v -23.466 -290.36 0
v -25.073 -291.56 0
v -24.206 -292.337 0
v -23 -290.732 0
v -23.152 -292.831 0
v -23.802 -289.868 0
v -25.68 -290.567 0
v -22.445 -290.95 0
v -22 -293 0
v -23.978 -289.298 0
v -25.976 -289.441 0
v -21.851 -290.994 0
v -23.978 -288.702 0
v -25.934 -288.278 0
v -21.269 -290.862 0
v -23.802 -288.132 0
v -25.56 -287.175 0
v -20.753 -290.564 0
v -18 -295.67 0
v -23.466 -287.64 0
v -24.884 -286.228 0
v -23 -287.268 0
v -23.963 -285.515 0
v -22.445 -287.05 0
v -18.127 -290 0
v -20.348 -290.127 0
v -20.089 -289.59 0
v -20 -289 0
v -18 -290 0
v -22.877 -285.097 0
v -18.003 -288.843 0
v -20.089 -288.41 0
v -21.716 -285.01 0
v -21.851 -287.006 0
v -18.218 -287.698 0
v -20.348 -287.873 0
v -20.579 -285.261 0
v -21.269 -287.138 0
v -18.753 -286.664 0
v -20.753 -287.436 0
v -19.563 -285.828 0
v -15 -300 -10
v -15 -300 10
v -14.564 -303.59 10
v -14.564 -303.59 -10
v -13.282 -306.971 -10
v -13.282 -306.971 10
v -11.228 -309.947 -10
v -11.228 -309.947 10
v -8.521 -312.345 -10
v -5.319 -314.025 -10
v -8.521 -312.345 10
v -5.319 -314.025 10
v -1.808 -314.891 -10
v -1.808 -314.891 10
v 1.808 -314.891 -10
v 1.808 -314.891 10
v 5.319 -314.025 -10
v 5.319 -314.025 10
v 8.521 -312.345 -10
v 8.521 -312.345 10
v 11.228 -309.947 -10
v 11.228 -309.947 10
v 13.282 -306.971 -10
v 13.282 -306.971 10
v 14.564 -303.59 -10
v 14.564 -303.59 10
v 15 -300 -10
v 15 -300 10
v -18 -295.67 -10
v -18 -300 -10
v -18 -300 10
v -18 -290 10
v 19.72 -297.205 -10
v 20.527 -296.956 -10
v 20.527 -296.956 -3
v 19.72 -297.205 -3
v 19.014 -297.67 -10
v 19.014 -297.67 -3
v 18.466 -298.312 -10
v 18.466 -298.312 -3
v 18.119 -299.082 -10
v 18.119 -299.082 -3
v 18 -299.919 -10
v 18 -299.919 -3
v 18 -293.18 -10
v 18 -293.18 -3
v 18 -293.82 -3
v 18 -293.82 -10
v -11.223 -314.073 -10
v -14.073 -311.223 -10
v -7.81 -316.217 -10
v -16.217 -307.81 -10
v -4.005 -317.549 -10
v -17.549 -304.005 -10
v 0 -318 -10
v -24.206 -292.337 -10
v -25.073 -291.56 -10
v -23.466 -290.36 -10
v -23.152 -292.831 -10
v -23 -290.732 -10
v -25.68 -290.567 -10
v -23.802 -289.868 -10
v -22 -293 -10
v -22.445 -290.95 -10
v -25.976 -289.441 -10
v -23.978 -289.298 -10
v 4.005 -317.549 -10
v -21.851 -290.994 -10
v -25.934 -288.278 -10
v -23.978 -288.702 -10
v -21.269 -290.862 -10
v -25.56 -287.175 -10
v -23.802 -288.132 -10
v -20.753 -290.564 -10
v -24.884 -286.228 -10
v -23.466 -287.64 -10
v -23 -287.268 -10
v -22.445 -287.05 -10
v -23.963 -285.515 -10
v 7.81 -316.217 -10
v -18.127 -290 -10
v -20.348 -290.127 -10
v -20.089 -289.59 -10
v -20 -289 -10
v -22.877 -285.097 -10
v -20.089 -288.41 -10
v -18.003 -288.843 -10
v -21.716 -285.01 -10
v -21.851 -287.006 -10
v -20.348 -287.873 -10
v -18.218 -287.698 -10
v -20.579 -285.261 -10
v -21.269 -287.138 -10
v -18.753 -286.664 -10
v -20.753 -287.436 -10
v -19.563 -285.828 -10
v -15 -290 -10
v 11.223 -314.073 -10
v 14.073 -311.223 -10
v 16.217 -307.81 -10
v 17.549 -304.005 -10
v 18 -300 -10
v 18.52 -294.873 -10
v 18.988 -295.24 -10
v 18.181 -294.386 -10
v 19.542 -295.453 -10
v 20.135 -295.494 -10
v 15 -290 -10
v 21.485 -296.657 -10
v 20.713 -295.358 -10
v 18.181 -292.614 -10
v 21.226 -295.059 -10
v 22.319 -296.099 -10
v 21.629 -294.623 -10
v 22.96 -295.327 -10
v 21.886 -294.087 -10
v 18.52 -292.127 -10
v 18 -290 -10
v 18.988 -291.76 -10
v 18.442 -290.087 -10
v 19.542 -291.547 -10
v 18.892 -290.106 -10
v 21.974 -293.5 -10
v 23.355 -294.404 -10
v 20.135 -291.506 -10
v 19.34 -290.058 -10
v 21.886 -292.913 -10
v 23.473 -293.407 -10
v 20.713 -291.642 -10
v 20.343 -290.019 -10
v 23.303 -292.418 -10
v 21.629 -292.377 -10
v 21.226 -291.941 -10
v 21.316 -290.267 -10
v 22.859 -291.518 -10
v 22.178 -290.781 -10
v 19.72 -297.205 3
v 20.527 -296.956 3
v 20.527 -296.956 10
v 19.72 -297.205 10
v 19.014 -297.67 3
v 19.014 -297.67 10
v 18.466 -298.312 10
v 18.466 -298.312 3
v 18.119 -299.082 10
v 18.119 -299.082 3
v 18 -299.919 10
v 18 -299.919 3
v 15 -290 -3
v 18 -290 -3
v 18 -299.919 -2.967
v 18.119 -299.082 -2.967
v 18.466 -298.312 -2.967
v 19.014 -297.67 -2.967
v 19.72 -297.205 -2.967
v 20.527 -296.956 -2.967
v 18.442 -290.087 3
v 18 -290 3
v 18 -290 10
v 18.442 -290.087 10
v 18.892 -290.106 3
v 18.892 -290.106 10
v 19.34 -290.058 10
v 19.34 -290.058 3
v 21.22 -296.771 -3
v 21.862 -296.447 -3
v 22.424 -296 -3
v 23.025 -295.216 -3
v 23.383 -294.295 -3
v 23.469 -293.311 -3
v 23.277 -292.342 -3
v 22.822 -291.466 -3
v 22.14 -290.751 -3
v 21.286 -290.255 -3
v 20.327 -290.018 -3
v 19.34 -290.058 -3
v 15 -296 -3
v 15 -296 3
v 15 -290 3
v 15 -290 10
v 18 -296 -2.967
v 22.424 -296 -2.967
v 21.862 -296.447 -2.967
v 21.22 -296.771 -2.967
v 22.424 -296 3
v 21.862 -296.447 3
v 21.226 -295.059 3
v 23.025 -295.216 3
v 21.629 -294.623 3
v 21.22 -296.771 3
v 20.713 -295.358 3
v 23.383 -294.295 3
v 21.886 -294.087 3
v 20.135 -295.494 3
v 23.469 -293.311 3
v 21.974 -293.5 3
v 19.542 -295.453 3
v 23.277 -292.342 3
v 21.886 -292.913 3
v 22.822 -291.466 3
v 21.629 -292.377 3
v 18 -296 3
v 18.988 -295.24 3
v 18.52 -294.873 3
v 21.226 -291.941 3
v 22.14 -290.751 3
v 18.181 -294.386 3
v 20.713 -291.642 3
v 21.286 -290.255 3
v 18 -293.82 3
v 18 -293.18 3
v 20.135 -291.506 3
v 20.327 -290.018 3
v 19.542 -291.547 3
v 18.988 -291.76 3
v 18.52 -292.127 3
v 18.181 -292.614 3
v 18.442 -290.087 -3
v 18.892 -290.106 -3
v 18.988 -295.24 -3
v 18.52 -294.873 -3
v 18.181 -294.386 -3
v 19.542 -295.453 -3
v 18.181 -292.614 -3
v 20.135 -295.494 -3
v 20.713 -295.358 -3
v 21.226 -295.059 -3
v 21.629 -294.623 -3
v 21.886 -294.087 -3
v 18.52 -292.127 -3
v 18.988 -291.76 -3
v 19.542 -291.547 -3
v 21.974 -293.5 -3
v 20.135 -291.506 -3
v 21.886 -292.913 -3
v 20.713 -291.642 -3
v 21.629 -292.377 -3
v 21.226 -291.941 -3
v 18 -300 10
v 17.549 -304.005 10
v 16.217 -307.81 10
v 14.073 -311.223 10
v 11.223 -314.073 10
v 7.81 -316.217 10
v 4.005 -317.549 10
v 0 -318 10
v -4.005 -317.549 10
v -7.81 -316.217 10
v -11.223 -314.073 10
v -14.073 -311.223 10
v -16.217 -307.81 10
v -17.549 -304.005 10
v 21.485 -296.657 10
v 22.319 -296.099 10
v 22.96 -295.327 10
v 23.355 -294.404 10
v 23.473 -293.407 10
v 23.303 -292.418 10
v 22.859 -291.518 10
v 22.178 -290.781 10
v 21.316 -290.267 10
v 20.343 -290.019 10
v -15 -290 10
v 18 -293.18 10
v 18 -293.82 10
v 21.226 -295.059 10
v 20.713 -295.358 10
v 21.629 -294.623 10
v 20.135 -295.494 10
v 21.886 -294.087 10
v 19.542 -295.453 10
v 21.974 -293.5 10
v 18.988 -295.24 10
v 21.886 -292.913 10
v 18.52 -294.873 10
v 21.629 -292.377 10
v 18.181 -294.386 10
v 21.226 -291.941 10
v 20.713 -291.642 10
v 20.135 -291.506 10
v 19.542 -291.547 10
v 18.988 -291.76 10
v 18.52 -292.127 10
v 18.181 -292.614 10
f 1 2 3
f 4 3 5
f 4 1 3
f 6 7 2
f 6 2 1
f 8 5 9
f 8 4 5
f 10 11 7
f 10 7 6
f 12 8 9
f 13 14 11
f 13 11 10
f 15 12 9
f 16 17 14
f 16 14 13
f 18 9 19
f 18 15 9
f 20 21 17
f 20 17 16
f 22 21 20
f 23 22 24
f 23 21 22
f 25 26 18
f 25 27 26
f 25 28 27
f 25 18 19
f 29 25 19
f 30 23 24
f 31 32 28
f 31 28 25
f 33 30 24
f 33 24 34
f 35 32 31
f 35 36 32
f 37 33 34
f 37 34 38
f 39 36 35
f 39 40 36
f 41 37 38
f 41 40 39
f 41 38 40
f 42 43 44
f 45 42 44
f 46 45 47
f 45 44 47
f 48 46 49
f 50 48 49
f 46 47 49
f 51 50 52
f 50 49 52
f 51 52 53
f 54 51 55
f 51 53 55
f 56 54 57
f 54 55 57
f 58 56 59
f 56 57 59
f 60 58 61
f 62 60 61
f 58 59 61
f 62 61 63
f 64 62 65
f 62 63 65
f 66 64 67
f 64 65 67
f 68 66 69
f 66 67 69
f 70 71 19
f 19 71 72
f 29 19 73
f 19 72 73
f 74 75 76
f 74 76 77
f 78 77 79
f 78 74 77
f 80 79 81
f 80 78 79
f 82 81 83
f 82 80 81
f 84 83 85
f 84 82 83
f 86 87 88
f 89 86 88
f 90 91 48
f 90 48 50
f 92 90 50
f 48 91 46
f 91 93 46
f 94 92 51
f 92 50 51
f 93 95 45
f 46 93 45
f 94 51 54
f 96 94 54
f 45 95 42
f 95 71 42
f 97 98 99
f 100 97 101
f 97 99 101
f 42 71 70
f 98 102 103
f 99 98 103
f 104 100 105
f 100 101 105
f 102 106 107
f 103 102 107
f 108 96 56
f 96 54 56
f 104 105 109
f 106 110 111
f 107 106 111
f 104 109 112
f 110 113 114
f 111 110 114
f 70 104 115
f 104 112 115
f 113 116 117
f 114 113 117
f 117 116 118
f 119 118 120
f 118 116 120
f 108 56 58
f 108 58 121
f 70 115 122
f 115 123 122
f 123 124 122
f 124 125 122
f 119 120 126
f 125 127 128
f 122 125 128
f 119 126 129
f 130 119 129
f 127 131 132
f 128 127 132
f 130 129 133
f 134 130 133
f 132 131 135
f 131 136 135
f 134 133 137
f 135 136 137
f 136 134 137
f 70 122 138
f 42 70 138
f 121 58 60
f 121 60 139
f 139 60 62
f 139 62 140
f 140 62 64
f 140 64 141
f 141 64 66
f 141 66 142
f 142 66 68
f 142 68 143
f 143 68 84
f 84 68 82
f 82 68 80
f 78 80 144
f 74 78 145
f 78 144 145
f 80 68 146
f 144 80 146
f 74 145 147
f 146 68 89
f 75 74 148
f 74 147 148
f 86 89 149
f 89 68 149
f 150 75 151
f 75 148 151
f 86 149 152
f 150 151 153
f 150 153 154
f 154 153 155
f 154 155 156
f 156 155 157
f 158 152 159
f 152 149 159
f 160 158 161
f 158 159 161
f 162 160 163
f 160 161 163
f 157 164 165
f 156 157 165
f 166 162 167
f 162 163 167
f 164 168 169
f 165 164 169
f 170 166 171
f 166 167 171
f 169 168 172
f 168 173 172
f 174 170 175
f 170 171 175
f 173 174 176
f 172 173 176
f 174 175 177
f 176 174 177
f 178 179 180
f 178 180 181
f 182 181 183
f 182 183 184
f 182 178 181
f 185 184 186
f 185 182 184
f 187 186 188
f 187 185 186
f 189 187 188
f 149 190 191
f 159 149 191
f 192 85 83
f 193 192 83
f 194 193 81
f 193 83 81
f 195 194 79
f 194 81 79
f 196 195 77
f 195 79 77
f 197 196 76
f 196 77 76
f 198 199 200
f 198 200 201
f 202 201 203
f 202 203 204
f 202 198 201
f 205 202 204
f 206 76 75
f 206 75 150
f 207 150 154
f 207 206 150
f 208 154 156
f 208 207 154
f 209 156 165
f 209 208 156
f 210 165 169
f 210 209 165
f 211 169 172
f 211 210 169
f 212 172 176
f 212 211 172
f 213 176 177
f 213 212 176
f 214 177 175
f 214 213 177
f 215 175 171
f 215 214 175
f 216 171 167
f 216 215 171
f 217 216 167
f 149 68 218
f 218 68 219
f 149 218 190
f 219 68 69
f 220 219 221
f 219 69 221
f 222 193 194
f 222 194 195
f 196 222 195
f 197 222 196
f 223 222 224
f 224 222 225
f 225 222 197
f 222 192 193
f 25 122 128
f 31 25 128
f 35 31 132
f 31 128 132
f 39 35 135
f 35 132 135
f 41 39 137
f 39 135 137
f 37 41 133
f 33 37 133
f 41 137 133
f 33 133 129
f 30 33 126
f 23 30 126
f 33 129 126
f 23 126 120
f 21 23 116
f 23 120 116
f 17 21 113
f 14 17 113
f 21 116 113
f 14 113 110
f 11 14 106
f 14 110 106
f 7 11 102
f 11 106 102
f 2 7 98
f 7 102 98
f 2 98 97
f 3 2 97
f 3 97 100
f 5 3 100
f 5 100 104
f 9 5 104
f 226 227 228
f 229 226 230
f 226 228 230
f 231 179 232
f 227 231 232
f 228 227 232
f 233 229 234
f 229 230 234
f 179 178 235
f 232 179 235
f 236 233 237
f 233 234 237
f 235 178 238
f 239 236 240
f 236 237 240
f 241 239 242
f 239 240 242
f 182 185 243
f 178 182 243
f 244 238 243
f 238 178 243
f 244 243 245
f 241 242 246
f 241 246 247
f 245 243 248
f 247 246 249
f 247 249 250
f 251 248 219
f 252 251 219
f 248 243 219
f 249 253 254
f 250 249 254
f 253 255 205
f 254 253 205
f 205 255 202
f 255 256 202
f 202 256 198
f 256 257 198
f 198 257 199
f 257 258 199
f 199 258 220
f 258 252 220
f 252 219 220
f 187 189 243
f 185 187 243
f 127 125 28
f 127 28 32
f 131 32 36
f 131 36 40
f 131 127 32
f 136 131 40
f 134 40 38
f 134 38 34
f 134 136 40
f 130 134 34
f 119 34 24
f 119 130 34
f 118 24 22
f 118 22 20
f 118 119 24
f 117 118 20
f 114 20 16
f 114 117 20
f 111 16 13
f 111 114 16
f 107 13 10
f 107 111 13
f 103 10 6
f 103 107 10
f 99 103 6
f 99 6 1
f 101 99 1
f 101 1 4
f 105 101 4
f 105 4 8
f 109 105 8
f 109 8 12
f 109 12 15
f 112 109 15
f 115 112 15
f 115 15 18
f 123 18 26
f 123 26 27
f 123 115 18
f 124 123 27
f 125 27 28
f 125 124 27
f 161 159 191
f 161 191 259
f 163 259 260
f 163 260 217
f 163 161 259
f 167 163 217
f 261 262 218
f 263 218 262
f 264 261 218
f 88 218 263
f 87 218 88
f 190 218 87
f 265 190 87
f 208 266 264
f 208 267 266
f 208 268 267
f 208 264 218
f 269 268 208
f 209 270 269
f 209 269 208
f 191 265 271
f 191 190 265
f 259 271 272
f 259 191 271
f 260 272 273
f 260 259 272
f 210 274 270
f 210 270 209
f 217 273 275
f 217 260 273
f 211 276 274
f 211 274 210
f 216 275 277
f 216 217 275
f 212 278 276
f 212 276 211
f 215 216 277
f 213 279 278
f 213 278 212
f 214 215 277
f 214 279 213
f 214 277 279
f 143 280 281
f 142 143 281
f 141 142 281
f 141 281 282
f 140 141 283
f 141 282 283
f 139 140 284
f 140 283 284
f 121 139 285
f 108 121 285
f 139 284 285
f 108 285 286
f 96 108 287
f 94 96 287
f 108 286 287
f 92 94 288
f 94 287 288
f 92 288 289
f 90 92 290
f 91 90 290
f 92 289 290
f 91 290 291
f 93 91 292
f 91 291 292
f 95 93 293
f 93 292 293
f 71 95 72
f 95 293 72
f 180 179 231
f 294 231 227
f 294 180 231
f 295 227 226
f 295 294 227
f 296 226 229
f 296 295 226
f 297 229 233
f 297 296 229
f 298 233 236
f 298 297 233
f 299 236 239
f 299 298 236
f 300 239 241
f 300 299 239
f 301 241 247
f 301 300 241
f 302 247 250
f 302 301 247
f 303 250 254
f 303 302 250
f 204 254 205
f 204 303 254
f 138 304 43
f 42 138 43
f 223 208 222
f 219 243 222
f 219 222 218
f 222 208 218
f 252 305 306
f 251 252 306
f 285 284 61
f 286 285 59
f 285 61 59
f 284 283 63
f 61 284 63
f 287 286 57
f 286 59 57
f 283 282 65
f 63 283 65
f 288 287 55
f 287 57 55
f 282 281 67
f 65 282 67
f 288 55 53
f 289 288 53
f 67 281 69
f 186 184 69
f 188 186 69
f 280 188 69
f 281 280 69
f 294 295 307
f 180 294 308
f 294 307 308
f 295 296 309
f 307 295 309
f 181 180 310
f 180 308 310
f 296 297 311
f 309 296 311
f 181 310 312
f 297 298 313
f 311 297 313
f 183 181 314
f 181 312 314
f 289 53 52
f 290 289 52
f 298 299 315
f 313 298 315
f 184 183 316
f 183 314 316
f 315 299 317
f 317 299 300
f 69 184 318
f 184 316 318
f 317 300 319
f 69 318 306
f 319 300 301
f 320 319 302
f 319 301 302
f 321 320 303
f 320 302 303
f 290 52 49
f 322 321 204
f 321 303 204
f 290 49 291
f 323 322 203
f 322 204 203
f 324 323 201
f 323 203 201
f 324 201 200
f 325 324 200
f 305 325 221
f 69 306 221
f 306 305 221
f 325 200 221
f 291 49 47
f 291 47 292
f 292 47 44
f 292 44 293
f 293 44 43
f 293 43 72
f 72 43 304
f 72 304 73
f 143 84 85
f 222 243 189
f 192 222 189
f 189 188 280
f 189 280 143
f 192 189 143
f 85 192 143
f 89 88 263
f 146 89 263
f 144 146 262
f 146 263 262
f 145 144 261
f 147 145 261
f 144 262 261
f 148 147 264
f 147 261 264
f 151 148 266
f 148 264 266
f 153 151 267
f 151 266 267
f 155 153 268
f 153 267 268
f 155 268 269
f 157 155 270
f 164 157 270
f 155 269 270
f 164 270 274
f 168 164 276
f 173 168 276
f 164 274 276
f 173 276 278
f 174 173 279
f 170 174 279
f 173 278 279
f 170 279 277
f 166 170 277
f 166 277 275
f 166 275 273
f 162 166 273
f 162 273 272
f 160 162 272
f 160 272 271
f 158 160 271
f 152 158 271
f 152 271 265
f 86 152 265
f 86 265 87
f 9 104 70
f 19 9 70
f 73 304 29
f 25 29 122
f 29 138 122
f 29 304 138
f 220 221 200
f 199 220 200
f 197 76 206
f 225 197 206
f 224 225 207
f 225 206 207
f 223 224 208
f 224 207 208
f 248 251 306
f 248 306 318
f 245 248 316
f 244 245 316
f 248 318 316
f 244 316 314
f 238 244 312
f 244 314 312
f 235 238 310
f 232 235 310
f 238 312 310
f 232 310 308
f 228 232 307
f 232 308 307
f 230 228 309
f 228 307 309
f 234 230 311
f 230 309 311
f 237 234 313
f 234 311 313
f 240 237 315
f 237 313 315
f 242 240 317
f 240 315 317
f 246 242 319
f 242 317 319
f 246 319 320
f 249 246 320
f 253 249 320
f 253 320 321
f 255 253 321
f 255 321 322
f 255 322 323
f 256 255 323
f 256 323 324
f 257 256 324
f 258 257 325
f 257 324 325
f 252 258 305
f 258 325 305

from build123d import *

# Parameters (mm, degrees)
SKETCH1_R                           = 4
SKETCH1_R_2                         = 2
BOSS_EXTRUDE1_DEPTH                 = 10
BOSS_EXTRUDE2_DEPTH                 = 20
BOSS_EXTRUDE3_DEPTH                 = 10
SKETCH5_R                           = 3.5
SKETCH5_R_2                         = 2
BOSS_EXTRUDE4_DEPTH                 = 20
SKETCH4_W                           = 6
SKETCH4_H                           = 6.000142194
CUT_EXTRUDE1_DEPTH                  = 3
CUT_EXTRUDE1_DIRECTION_2_REACH      = 323.185
CUT_EXTRUDE1_DIRECTION_2_END_RADIUS = 3.5
FILLET2_R                           = 3
SKETCH6_W                           = 4.423537042
SKETCH6_H                           = 5.967206981
CUT_EXTRUDE2_DEPTH                  = 36.49639057
BODY_MOVE_COPY1_OUTLINE_R           = 2
BODY_MOVE_COPY1_DEPTH               = 10
BODY_MOVE_COPY1_START               = 2.967206981
BODY_MOVE_COPY1_2_DEPTH             = 0.032793019
BODY_MOVE_COPY1_START_2             = -10
BODY_MOVE_COPY1_3_OUTLINE_R         = 2
BODY_MOVE_COPY1_3_DEPTH             = 10
BODY_MOVE_COPY1_START_3             = -3
BODY_MOVE_COPY1_4_DEPTH             = 0.032793019


# Read off the part's stored shape, not the designer's step: Body-Move/Copy1
with BuildPart() as part:
    # Sketch1 → Boss-Extrude1 (new body)
    with BuildSketch(Plane.XY):
        with Locations(Location((-22, -289, 0), (0, 0, 270))):
            Circle(SKETCH1_R)
        with Locations(Location((-22, -289, 0), (0, 0, 270))):
            Circle(SKETCH1_R_2, mode=Mode.SUBTRACT)
    extrude(amount=BOSS_EXTRUDE1_DEPTH)



with BuildPart() as body_2:
    # Sketch2 → Boss-Extrude2 (new body)
    with BuildSketch(Plane.XY.offset(10)):
        with BuildLine():
            Line((-18, -300), (-18, -295.71047836))
            Line((-18, -295.71047836), (-18, -290))
            Line((-18, -290), (-15, -290))
            Line((-15, -290), (-15, -300))
            ThreePointArc((-15, -300), (0, -315), (15, -300))
            Line((15, -300), (15, -290))
            Line((15, -290), (18, -290))
            Line((18, -290), (18, -300))
            ThreePointArc((18, -300), (0, -318), (-18, -300))
        make_face()
    extrude(amount=-BOSS_EXTRUDE2_DEPTH)


with BuildPart() as part_1:
    add(part.part)

    add(body_2.part)  # Boss-Extrude3 merges body 2
    # Sketch3 → Boss-Extrude3 (add)
    with BuildSketch(Plane.XY.offset(10)):
        Polygon((-18, -290), (-18.290403154, -290), (-22, -293), (-18, -295.669919522), align=None)
    extrude(amount=-BOSS_EXTRUDE3_DEPTH)

    # Sketch5 → Boss-Extrude4 (add)
    with BuildSketch(Plane.XY.offset(10)):
        with Locations((19.974192434, -293.5)):
            Circle(SKETCH5_R)
        with Locations((19.974192434, -293.5)):
            Circle(SKETCH5_R_2, mode=Mode.SUBTRACT)
    extrude(amount=-BOSS_EXTRUDE4_DEPTH)

    # Sketch4 → Cut-Extrude1 (cut)
    with BuildSketch(Plane(origin=(18, 0, 0), x_dir=(0, 0, -1), z_dir=(1, 0, 0))):
        with Locations((0, -293.000071097)):
            Rectangle(SKETCH4_W, SKETCH4_H)
    extrude(amount=-CUT_EXTRUDE1_DEPTH, mode=Mode.SUBTRACT)

    # Cut-Extrude1 direction 2: up to this cylinder (the profile starts inside it)
    cut_extrude1_direction_2_end = Plane(origin=(19.974192434, -293.5, 0), z_dir=(0, 0, 1)) * Cylinder(CUT_EXTRUDE1_DIRECTION_2_END_RADIUS, 654.37, mode=Mode.PRIVATE)
    # Sketch4 → Cut-Extrude1 direction 2 (cut, up to the surface)
    with BuildSketch(Plane(origin=(18, 0, 0), x_dir=(0, 0, -1), z_dir=(1, 0, 0)), mode=Mode.PRIVATE) as cut_extrude1_direction_2_sk1:
        with Locations((0, -293.000071097)):
            Rectangle(SKETCH4_W, SKETCH4_H)
    cut_extrude1_direction_2_tool1 = extrude(cut_extrude1_direction_2_sk1.sketch, amount=CUT_EXTRUDE1_DIRECTION_2_REACH, mode=Mode.PRIVATE) & cut_extrude1_direction_2_end
    add(cut_extrude1_direction_2_tool1.solids().sort_by_distance((18, -293.000071, 0))[0], mode=Mode.SUBTRACT)

    # Fillet2
    # the kernel refuses this fillet: 3 mm, written as the material it adds along each edge
    with BuildSketch(Plane(origin=(18, -290.609919684, -10), x_dir=(1.5610699103436222e-12, 1.0, 0), z_dir=(0, 0, 1)), Plane(origin=(18, -290.609919684, 3), x_dir=(1.5610699103436222e-12, 1.0, 0), z_dir=(0, 0, 1))) as fillet2_piece_1:
        with BuildLine():
            CenterArc((3.502304969, -0.796308584), FILLET2_R, 164.60712684, 25.833288924)
            Line((0.551973299, -1.339947284), (0.492966665, -1.350820058))
            ThreePointArc((0.492966665, -1.350820058), (0.29061984, -0.663945695), (-0.049544234, -0.033843299))
            Line((-0.049544234, -0.033843299), (0, 0.06))
            ThreePointArc((0, 0.06), (0.304959842, 0.06), (0.552071978, 0.015926172))
            Line((0.552071978, 0.015926172), (0.609919684, 0))
        make_face()
    extrude(amount=7)
    with BuildSketch(Plane(origin=(18, -296.390080316, -10), x_dir=(0.975809068162025, -0.21862447825611958, 0), z_dir=(0, 0, 1))) as fillet2_piece_2:
        with BuildLine():
            CenterArc((3.698835937, -2.787234318), FILLET2_R, 111.708438384, 80.919816446)
            Line((0.771408732, -3.443107753), (0.712860188, -3.456225222))
            Line((0.712860188, -3.456225222), (-0.058548544, -0.013117469))
            Line((-0.058548544, -0.013117469), (0.022193016, 0.055744686))
            ThreePointArc((0.022193016, 0.055744686), (1.294592578, -0.188226629), (2.56699214, 0.055744686))
            Line((2.56699214, 0.055744686), (2.589185156, 0))
        make_face()
    extrude(amount=20)

    # Sketch6 → Cut-Extrude2 (cut, through all)
    with BuildSketch(Plane(origin=(0, -296.000142194, 0), x_dir=(1, 0, 0), z_dir=(0, 1, 0))):
        with Locations((20.211768521, 0.016396509)):
            Rectangle(SKETCH6_W, SKETCH6_H)
    extrude(amount=-CUT_EXTRUDE2_DEPTH, mode=Mode.SUBTRACT)

    # Body-Move/Copy1 outline → Body-Move/Copy1 (cut)
    with BuildSketch(Plane.XY):
        with BuildLine():
            Line((-18, -290), (-18.127016654, -290))
            ThreePointArc((-18.127016654, -290), (-24.449489743, -285.83772234), (-22, -293))
            Line((-22, -293), (-18, -295.669919522))
            Line((-18, -295.669919522), (-18, -290))
        make_face()
        with Locations((-22, -289)):
            Circle(BODY_MOVE_COPY1_OUTLINE_R, mode=Mode.SUBTRACT)
    extrude(amount=BODY_MOVE_COPY1_DEPTH, mode=Mode.SUBTRACT)

    # Body-Move_Copy1 2 outline → Body-Move_Copy1 2 (cut)
    with BuildSketch(Plane.XY.offset(BODY_MOVE_COPY1_START)):
        with BuildLine():
            ThreePointArc((20.526550354, -296.95613957), (21.549323306, -296.625533992), (22.423537042, -296.000142194))
            Line((22.423537042, -296.000142194), (18, -296.000142194))
            Line((18, -296.000142194), (18, -299.918544916))
            ThreePointArc((18, -299.918544916), (18.71741934, -297.971797492), (20.526550354, -296.95613957))
        make_face()
    extrude(amount=BODY_MOVE_COPY1_2_DEPTH, mode=Mode.SUBTRACT)

    # Body-Move_Copy1 3 outline → Body-Move_Copy1 3 (add)
    with BuildSketch(Plane.XY.offset(BODY_MOVE_COPY1_START_2)):
        with BuildLine():
            Line((-18, -290), (-18.127016654, -290))
            ThreePointArc((-18.127016654, -290), (-24.449489743, -285.83772234), (-22, -293))
            Line((-22, -293), (-18, -295.669919522))
            Line((-18, -295.669919522), (-18, -290))
        make_face()
        with Locations((-22, -289)):
            Circle(BODY_MOVE_COPY1_3_OUTLINE_R, mode=Mode.SUBTRACT)
    extrude(amount=BODY_MOVE_COPY1_3_DEPTH)

    # Body-Move_Copy1 4 outline → Body-Move_Copy1 4 (add)
    with BuildSketch(Plane.XY.offset(BODY_MOVE_COPY1_START_3)):
        with BuildLine():
            ThreePointArc((20.526550354, -296.95613957), (21.549323306, -296.625533992), (22.423537042, -296.000142194))
            Line((22.423537042, -296.000142194), (18, -296.000142194))
            Line((18, -296.000142194), (18, -299.918544916))
            ThreePointArc((18, -299.918544916), (18.71741934, -297.971797492), (20.526550354, -296.95613957))
        make_face()
    extrude(amount=BODY_MOVE_COPY1_4_DEPTH)


solid = part_1.part
